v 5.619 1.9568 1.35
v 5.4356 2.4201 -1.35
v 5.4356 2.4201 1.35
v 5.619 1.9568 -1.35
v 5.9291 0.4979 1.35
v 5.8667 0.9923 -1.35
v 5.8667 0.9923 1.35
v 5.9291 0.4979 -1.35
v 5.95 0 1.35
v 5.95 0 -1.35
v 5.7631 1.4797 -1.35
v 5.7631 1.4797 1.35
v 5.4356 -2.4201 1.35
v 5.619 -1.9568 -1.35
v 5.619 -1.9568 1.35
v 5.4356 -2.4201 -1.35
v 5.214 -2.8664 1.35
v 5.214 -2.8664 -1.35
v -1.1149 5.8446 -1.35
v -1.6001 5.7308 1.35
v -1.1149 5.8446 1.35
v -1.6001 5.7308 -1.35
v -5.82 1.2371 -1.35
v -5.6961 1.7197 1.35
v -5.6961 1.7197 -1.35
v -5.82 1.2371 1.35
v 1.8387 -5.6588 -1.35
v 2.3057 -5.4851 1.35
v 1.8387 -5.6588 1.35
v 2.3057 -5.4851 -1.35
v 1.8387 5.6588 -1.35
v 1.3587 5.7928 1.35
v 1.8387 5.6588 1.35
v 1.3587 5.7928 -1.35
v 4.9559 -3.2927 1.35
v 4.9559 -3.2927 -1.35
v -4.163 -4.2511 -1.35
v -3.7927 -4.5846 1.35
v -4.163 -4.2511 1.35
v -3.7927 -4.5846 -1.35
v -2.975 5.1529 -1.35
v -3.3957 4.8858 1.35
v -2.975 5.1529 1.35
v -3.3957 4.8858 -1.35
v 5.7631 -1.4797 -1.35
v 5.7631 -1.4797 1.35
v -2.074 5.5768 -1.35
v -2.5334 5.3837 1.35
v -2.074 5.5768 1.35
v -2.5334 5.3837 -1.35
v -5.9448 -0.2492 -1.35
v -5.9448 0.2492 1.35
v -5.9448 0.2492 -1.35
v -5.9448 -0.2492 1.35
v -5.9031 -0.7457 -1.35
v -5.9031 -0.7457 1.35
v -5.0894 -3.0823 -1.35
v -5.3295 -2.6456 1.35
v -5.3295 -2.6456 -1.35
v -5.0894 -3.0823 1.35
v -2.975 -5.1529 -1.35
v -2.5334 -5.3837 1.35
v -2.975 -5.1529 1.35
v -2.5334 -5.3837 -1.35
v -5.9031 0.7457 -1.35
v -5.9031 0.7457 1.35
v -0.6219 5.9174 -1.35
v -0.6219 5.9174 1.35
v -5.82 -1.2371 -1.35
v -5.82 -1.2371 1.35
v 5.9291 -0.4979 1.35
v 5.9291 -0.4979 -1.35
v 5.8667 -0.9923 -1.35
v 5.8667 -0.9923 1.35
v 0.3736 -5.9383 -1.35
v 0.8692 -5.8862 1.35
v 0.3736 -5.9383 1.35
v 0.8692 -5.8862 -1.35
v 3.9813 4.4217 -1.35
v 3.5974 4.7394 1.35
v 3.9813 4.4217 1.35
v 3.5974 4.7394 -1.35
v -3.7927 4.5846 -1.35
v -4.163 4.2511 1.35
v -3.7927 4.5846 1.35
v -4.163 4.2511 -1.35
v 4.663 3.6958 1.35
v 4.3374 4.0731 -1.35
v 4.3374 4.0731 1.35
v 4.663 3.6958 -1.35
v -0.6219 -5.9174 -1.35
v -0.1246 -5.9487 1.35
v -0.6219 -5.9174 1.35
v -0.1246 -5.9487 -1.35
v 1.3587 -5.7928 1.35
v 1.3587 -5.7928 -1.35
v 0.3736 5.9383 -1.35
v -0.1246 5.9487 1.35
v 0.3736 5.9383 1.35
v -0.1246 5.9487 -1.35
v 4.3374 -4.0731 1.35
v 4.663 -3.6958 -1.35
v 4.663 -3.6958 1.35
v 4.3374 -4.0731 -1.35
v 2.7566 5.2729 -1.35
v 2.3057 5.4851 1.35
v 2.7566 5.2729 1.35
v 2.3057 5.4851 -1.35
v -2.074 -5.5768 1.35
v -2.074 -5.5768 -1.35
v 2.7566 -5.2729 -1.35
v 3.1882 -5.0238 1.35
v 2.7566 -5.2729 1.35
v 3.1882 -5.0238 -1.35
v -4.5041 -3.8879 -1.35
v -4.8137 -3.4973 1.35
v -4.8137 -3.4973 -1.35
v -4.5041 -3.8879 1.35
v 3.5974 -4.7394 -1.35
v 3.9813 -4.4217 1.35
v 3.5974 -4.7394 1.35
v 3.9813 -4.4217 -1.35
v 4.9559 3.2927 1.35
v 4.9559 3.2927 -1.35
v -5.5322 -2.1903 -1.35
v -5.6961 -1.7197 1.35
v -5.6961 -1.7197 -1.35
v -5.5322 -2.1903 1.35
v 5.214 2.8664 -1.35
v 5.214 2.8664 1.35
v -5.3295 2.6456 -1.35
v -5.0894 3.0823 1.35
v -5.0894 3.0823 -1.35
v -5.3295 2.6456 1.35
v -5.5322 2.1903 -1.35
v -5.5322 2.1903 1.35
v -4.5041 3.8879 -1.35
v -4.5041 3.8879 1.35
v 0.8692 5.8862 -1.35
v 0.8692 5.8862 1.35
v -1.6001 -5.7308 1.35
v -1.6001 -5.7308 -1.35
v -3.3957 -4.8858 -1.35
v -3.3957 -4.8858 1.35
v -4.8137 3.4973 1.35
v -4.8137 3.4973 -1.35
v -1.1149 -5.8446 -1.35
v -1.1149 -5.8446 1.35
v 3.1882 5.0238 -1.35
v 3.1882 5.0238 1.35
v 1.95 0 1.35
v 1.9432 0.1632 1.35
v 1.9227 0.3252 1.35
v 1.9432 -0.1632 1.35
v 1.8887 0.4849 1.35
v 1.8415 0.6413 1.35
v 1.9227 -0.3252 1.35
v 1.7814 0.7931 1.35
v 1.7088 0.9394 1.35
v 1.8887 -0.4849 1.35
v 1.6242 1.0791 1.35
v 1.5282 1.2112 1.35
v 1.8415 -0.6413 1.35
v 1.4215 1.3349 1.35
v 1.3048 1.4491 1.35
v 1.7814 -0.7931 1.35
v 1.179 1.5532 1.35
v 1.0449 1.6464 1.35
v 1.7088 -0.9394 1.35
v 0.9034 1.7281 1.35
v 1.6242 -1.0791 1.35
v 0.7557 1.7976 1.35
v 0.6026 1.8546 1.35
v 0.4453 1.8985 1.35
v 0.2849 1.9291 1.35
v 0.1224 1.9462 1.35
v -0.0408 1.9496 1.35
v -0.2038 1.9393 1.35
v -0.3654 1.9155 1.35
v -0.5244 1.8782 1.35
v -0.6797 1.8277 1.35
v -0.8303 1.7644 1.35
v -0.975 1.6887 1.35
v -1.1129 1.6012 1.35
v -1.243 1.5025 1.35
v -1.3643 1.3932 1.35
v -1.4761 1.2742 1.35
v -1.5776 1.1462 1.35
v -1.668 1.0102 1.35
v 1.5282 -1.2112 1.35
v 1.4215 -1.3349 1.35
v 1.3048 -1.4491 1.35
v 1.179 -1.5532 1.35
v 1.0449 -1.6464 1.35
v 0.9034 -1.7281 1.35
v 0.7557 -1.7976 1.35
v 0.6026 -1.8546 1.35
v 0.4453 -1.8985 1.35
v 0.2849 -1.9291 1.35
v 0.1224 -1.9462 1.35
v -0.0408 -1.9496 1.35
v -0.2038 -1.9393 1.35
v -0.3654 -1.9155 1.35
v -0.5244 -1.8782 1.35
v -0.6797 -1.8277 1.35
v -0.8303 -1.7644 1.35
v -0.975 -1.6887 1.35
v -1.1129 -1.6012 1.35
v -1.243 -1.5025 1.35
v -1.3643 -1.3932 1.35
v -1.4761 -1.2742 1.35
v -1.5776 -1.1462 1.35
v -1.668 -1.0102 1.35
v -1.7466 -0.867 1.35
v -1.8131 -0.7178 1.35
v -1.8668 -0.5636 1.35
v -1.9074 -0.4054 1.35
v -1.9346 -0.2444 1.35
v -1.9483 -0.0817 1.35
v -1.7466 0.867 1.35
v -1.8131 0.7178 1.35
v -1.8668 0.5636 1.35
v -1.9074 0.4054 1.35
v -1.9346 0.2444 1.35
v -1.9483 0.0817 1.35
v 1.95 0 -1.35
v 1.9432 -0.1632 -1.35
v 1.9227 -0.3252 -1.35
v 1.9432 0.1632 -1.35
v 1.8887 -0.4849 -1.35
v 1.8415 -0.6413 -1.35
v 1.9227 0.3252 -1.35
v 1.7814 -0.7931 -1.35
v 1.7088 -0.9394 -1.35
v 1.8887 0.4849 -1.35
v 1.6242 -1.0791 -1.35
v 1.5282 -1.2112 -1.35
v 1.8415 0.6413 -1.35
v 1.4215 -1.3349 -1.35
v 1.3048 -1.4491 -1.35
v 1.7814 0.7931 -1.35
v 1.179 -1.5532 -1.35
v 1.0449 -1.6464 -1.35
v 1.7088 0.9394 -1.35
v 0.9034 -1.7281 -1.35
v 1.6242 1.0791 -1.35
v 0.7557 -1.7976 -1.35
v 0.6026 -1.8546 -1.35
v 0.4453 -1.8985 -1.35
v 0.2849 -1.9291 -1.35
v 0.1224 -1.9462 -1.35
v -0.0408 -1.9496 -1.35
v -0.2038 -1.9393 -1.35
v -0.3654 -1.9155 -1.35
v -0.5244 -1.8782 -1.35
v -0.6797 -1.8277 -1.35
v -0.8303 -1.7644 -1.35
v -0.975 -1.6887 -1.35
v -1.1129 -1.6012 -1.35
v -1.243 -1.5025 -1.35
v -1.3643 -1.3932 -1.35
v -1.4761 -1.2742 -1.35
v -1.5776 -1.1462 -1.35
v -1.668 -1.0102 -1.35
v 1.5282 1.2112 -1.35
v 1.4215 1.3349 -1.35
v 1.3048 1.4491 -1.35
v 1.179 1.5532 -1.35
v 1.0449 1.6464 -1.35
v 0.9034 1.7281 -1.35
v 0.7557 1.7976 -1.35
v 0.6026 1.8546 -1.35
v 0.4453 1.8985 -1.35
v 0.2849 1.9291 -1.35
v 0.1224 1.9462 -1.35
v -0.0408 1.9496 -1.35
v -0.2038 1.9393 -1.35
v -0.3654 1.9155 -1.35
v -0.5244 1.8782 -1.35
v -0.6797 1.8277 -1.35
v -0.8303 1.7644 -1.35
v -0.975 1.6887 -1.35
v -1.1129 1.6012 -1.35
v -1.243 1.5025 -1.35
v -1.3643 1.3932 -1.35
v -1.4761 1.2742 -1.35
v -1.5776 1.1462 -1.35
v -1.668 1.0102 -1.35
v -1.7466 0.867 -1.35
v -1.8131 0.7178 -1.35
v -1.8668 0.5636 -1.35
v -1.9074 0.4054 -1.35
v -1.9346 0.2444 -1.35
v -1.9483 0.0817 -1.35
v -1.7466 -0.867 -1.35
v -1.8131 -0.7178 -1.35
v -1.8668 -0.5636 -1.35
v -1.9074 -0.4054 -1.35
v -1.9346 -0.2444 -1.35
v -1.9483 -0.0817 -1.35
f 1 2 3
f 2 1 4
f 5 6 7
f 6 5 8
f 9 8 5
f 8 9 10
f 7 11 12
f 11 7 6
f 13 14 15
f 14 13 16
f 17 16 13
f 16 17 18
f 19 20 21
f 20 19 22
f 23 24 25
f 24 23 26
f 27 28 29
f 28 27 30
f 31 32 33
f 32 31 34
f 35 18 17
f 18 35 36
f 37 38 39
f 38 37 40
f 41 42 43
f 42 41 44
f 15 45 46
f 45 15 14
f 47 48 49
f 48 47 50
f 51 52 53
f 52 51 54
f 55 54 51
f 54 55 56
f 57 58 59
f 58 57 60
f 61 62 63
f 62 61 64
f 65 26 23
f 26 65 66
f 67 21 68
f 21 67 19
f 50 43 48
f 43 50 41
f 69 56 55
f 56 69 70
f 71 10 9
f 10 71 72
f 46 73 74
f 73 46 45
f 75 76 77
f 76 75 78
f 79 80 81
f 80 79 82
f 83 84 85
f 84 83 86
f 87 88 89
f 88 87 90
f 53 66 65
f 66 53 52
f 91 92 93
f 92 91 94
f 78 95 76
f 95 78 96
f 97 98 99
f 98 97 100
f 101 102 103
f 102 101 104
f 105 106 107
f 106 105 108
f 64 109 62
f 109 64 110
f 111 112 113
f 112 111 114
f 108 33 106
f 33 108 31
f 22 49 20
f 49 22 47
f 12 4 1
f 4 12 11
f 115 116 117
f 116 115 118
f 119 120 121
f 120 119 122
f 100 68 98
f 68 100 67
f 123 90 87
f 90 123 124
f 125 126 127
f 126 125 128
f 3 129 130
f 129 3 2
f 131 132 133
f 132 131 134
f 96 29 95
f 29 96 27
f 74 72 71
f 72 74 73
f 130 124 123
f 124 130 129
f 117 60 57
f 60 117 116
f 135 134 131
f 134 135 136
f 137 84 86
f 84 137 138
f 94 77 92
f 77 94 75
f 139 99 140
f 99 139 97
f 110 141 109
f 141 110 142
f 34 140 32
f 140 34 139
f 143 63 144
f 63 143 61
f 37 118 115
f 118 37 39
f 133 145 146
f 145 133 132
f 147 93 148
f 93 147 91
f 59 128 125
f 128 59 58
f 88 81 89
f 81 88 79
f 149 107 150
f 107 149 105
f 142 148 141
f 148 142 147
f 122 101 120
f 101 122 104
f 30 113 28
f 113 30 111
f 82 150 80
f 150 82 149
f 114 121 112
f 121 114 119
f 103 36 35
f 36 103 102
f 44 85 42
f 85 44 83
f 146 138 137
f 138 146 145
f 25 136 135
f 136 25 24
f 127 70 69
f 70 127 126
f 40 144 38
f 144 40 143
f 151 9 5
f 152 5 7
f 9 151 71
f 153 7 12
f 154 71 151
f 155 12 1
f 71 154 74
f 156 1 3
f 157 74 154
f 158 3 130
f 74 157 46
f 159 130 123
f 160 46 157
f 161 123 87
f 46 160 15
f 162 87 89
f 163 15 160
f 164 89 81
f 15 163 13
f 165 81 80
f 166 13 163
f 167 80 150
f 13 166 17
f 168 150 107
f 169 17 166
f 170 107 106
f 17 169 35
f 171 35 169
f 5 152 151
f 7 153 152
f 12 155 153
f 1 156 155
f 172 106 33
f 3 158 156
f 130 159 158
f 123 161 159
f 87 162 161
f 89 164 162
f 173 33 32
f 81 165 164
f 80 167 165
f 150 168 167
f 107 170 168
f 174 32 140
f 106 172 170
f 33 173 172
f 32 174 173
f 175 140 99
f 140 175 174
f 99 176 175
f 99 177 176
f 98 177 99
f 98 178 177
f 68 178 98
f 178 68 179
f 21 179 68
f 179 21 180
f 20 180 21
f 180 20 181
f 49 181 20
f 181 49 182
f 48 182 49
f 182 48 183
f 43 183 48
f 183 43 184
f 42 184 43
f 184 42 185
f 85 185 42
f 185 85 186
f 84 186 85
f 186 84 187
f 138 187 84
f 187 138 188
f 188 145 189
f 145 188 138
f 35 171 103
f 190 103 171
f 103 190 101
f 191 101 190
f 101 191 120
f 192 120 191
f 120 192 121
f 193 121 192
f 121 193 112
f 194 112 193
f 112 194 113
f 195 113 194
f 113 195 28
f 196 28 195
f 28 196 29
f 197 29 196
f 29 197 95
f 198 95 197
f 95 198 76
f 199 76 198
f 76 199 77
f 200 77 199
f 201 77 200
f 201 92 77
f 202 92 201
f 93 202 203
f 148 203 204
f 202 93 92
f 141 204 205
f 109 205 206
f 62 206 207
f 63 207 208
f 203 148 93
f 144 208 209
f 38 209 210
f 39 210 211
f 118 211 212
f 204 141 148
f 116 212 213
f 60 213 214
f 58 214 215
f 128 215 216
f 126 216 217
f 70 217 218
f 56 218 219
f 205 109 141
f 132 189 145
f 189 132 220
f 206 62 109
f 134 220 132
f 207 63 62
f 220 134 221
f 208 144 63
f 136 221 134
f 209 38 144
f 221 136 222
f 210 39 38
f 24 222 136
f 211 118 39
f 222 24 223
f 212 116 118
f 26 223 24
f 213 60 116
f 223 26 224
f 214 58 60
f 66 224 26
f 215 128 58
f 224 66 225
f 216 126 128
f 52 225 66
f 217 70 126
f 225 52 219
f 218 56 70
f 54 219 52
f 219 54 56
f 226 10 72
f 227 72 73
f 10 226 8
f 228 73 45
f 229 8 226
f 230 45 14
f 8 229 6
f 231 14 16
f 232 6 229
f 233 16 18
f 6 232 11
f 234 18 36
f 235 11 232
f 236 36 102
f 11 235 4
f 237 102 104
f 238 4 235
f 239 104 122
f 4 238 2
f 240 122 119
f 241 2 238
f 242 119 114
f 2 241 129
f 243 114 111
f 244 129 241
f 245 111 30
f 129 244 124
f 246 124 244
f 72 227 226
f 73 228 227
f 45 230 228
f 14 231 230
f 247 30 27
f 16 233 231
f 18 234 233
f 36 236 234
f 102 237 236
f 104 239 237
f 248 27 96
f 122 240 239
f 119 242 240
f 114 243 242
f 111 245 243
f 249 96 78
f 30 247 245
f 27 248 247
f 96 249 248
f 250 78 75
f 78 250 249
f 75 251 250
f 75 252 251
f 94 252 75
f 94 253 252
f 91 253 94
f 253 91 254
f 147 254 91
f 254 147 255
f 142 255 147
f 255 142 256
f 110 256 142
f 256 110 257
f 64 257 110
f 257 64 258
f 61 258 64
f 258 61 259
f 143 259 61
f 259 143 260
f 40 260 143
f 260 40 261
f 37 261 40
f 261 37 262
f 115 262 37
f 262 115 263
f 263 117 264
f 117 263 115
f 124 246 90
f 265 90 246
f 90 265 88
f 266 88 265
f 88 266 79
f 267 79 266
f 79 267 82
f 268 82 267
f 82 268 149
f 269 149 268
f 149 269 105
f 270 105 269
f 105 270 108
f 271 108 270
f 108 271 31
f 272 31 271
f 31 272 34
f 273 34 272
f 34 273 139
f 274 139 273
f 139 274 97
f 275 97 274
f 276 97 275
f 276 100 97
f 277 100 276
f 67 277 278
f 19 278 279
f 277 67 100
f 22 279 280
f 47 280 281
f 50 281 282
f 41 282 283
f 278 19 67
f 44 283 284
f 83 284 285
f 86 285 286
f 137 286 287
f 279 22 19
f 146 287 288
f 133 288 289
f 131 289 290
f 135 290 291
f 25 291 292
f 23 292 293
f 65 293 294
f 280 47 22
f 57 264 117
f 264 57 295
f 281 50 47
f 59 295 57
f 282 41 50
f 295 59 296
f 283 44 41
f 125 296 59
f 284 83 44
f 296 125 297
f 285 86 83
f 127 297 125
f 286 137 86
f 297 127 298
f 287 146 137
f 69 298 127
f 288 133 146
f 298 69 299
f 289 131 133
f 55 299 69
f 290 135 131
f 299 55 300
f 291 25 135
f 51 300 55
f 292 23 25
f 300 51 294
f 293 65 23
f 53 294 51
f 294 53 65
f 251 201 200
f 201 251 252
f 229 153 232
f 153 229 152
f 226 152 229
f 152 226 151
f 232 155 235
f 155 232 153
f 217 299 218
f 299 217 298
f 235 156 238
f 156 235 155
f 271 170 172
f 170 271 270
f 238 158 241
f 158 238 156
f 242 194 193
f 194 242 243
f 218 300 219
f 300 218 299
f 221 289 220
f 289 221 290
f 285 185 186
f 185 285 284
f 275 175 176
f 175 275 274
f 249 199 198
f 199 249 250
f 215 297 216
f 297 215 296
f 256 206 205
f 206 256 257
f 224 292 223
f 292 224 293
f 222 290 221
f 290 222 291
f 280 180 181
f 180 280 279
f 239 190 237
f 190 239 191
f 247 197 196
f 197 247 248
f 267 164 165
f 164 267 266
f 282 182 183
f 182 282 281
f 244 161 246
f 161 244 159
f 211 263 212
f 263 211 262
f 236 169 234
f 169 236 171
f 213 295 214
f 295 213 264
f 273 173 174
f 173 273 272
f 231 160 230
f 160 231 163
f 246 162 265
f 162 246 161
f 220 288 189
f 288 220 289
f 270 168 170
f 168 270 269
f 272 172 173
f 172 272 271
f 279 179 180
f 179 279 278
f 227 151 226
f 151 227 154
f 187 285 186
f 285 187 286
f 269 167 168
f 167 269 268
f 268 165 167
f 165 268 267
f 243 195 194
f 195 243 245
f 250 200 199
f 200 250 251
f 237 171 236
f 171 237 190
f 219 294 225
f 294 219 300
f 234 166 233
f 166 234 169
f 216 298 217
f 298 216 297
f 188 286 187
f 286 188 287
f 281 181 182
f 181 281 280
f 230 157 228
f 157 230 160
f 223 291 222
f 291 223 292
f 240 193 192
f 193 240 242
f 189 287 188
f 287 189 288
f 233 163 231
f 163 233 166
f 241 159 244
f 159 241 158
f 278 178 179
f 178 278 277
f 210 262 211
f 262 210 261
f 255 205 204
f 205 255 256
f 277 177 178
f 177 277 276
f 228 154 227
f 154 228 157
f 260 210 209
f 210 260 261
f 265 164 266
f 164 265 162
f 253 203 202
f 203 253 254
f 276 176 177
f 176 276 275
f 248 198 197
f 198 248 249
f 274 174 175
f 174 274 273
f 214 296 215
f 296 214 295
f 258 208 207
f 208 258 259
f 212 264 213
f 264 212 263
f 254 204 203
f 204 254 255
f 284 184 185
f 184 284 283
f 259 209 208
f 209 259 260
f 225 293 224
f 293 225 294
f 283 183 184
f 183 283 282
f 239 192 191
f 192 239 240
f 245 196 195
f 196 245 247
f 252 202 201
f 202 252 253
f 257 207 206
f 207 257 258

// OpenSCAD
// created by IndiePandaaaaa|Lukas

TOLERANCE = .1;
$fn = 75;

module unterlagsscheibe(id, od, thickness, tolerance = .1, fn = 75) {
  $fn = fn;

  difference() {
    cylinder(d = od - tolerance, h = thickness, center = true);
    cylinder(d = id + tolerance, h = thickness, center = true);
  }
}

unterlagsscheibe(3.8, 12, 2.7);
